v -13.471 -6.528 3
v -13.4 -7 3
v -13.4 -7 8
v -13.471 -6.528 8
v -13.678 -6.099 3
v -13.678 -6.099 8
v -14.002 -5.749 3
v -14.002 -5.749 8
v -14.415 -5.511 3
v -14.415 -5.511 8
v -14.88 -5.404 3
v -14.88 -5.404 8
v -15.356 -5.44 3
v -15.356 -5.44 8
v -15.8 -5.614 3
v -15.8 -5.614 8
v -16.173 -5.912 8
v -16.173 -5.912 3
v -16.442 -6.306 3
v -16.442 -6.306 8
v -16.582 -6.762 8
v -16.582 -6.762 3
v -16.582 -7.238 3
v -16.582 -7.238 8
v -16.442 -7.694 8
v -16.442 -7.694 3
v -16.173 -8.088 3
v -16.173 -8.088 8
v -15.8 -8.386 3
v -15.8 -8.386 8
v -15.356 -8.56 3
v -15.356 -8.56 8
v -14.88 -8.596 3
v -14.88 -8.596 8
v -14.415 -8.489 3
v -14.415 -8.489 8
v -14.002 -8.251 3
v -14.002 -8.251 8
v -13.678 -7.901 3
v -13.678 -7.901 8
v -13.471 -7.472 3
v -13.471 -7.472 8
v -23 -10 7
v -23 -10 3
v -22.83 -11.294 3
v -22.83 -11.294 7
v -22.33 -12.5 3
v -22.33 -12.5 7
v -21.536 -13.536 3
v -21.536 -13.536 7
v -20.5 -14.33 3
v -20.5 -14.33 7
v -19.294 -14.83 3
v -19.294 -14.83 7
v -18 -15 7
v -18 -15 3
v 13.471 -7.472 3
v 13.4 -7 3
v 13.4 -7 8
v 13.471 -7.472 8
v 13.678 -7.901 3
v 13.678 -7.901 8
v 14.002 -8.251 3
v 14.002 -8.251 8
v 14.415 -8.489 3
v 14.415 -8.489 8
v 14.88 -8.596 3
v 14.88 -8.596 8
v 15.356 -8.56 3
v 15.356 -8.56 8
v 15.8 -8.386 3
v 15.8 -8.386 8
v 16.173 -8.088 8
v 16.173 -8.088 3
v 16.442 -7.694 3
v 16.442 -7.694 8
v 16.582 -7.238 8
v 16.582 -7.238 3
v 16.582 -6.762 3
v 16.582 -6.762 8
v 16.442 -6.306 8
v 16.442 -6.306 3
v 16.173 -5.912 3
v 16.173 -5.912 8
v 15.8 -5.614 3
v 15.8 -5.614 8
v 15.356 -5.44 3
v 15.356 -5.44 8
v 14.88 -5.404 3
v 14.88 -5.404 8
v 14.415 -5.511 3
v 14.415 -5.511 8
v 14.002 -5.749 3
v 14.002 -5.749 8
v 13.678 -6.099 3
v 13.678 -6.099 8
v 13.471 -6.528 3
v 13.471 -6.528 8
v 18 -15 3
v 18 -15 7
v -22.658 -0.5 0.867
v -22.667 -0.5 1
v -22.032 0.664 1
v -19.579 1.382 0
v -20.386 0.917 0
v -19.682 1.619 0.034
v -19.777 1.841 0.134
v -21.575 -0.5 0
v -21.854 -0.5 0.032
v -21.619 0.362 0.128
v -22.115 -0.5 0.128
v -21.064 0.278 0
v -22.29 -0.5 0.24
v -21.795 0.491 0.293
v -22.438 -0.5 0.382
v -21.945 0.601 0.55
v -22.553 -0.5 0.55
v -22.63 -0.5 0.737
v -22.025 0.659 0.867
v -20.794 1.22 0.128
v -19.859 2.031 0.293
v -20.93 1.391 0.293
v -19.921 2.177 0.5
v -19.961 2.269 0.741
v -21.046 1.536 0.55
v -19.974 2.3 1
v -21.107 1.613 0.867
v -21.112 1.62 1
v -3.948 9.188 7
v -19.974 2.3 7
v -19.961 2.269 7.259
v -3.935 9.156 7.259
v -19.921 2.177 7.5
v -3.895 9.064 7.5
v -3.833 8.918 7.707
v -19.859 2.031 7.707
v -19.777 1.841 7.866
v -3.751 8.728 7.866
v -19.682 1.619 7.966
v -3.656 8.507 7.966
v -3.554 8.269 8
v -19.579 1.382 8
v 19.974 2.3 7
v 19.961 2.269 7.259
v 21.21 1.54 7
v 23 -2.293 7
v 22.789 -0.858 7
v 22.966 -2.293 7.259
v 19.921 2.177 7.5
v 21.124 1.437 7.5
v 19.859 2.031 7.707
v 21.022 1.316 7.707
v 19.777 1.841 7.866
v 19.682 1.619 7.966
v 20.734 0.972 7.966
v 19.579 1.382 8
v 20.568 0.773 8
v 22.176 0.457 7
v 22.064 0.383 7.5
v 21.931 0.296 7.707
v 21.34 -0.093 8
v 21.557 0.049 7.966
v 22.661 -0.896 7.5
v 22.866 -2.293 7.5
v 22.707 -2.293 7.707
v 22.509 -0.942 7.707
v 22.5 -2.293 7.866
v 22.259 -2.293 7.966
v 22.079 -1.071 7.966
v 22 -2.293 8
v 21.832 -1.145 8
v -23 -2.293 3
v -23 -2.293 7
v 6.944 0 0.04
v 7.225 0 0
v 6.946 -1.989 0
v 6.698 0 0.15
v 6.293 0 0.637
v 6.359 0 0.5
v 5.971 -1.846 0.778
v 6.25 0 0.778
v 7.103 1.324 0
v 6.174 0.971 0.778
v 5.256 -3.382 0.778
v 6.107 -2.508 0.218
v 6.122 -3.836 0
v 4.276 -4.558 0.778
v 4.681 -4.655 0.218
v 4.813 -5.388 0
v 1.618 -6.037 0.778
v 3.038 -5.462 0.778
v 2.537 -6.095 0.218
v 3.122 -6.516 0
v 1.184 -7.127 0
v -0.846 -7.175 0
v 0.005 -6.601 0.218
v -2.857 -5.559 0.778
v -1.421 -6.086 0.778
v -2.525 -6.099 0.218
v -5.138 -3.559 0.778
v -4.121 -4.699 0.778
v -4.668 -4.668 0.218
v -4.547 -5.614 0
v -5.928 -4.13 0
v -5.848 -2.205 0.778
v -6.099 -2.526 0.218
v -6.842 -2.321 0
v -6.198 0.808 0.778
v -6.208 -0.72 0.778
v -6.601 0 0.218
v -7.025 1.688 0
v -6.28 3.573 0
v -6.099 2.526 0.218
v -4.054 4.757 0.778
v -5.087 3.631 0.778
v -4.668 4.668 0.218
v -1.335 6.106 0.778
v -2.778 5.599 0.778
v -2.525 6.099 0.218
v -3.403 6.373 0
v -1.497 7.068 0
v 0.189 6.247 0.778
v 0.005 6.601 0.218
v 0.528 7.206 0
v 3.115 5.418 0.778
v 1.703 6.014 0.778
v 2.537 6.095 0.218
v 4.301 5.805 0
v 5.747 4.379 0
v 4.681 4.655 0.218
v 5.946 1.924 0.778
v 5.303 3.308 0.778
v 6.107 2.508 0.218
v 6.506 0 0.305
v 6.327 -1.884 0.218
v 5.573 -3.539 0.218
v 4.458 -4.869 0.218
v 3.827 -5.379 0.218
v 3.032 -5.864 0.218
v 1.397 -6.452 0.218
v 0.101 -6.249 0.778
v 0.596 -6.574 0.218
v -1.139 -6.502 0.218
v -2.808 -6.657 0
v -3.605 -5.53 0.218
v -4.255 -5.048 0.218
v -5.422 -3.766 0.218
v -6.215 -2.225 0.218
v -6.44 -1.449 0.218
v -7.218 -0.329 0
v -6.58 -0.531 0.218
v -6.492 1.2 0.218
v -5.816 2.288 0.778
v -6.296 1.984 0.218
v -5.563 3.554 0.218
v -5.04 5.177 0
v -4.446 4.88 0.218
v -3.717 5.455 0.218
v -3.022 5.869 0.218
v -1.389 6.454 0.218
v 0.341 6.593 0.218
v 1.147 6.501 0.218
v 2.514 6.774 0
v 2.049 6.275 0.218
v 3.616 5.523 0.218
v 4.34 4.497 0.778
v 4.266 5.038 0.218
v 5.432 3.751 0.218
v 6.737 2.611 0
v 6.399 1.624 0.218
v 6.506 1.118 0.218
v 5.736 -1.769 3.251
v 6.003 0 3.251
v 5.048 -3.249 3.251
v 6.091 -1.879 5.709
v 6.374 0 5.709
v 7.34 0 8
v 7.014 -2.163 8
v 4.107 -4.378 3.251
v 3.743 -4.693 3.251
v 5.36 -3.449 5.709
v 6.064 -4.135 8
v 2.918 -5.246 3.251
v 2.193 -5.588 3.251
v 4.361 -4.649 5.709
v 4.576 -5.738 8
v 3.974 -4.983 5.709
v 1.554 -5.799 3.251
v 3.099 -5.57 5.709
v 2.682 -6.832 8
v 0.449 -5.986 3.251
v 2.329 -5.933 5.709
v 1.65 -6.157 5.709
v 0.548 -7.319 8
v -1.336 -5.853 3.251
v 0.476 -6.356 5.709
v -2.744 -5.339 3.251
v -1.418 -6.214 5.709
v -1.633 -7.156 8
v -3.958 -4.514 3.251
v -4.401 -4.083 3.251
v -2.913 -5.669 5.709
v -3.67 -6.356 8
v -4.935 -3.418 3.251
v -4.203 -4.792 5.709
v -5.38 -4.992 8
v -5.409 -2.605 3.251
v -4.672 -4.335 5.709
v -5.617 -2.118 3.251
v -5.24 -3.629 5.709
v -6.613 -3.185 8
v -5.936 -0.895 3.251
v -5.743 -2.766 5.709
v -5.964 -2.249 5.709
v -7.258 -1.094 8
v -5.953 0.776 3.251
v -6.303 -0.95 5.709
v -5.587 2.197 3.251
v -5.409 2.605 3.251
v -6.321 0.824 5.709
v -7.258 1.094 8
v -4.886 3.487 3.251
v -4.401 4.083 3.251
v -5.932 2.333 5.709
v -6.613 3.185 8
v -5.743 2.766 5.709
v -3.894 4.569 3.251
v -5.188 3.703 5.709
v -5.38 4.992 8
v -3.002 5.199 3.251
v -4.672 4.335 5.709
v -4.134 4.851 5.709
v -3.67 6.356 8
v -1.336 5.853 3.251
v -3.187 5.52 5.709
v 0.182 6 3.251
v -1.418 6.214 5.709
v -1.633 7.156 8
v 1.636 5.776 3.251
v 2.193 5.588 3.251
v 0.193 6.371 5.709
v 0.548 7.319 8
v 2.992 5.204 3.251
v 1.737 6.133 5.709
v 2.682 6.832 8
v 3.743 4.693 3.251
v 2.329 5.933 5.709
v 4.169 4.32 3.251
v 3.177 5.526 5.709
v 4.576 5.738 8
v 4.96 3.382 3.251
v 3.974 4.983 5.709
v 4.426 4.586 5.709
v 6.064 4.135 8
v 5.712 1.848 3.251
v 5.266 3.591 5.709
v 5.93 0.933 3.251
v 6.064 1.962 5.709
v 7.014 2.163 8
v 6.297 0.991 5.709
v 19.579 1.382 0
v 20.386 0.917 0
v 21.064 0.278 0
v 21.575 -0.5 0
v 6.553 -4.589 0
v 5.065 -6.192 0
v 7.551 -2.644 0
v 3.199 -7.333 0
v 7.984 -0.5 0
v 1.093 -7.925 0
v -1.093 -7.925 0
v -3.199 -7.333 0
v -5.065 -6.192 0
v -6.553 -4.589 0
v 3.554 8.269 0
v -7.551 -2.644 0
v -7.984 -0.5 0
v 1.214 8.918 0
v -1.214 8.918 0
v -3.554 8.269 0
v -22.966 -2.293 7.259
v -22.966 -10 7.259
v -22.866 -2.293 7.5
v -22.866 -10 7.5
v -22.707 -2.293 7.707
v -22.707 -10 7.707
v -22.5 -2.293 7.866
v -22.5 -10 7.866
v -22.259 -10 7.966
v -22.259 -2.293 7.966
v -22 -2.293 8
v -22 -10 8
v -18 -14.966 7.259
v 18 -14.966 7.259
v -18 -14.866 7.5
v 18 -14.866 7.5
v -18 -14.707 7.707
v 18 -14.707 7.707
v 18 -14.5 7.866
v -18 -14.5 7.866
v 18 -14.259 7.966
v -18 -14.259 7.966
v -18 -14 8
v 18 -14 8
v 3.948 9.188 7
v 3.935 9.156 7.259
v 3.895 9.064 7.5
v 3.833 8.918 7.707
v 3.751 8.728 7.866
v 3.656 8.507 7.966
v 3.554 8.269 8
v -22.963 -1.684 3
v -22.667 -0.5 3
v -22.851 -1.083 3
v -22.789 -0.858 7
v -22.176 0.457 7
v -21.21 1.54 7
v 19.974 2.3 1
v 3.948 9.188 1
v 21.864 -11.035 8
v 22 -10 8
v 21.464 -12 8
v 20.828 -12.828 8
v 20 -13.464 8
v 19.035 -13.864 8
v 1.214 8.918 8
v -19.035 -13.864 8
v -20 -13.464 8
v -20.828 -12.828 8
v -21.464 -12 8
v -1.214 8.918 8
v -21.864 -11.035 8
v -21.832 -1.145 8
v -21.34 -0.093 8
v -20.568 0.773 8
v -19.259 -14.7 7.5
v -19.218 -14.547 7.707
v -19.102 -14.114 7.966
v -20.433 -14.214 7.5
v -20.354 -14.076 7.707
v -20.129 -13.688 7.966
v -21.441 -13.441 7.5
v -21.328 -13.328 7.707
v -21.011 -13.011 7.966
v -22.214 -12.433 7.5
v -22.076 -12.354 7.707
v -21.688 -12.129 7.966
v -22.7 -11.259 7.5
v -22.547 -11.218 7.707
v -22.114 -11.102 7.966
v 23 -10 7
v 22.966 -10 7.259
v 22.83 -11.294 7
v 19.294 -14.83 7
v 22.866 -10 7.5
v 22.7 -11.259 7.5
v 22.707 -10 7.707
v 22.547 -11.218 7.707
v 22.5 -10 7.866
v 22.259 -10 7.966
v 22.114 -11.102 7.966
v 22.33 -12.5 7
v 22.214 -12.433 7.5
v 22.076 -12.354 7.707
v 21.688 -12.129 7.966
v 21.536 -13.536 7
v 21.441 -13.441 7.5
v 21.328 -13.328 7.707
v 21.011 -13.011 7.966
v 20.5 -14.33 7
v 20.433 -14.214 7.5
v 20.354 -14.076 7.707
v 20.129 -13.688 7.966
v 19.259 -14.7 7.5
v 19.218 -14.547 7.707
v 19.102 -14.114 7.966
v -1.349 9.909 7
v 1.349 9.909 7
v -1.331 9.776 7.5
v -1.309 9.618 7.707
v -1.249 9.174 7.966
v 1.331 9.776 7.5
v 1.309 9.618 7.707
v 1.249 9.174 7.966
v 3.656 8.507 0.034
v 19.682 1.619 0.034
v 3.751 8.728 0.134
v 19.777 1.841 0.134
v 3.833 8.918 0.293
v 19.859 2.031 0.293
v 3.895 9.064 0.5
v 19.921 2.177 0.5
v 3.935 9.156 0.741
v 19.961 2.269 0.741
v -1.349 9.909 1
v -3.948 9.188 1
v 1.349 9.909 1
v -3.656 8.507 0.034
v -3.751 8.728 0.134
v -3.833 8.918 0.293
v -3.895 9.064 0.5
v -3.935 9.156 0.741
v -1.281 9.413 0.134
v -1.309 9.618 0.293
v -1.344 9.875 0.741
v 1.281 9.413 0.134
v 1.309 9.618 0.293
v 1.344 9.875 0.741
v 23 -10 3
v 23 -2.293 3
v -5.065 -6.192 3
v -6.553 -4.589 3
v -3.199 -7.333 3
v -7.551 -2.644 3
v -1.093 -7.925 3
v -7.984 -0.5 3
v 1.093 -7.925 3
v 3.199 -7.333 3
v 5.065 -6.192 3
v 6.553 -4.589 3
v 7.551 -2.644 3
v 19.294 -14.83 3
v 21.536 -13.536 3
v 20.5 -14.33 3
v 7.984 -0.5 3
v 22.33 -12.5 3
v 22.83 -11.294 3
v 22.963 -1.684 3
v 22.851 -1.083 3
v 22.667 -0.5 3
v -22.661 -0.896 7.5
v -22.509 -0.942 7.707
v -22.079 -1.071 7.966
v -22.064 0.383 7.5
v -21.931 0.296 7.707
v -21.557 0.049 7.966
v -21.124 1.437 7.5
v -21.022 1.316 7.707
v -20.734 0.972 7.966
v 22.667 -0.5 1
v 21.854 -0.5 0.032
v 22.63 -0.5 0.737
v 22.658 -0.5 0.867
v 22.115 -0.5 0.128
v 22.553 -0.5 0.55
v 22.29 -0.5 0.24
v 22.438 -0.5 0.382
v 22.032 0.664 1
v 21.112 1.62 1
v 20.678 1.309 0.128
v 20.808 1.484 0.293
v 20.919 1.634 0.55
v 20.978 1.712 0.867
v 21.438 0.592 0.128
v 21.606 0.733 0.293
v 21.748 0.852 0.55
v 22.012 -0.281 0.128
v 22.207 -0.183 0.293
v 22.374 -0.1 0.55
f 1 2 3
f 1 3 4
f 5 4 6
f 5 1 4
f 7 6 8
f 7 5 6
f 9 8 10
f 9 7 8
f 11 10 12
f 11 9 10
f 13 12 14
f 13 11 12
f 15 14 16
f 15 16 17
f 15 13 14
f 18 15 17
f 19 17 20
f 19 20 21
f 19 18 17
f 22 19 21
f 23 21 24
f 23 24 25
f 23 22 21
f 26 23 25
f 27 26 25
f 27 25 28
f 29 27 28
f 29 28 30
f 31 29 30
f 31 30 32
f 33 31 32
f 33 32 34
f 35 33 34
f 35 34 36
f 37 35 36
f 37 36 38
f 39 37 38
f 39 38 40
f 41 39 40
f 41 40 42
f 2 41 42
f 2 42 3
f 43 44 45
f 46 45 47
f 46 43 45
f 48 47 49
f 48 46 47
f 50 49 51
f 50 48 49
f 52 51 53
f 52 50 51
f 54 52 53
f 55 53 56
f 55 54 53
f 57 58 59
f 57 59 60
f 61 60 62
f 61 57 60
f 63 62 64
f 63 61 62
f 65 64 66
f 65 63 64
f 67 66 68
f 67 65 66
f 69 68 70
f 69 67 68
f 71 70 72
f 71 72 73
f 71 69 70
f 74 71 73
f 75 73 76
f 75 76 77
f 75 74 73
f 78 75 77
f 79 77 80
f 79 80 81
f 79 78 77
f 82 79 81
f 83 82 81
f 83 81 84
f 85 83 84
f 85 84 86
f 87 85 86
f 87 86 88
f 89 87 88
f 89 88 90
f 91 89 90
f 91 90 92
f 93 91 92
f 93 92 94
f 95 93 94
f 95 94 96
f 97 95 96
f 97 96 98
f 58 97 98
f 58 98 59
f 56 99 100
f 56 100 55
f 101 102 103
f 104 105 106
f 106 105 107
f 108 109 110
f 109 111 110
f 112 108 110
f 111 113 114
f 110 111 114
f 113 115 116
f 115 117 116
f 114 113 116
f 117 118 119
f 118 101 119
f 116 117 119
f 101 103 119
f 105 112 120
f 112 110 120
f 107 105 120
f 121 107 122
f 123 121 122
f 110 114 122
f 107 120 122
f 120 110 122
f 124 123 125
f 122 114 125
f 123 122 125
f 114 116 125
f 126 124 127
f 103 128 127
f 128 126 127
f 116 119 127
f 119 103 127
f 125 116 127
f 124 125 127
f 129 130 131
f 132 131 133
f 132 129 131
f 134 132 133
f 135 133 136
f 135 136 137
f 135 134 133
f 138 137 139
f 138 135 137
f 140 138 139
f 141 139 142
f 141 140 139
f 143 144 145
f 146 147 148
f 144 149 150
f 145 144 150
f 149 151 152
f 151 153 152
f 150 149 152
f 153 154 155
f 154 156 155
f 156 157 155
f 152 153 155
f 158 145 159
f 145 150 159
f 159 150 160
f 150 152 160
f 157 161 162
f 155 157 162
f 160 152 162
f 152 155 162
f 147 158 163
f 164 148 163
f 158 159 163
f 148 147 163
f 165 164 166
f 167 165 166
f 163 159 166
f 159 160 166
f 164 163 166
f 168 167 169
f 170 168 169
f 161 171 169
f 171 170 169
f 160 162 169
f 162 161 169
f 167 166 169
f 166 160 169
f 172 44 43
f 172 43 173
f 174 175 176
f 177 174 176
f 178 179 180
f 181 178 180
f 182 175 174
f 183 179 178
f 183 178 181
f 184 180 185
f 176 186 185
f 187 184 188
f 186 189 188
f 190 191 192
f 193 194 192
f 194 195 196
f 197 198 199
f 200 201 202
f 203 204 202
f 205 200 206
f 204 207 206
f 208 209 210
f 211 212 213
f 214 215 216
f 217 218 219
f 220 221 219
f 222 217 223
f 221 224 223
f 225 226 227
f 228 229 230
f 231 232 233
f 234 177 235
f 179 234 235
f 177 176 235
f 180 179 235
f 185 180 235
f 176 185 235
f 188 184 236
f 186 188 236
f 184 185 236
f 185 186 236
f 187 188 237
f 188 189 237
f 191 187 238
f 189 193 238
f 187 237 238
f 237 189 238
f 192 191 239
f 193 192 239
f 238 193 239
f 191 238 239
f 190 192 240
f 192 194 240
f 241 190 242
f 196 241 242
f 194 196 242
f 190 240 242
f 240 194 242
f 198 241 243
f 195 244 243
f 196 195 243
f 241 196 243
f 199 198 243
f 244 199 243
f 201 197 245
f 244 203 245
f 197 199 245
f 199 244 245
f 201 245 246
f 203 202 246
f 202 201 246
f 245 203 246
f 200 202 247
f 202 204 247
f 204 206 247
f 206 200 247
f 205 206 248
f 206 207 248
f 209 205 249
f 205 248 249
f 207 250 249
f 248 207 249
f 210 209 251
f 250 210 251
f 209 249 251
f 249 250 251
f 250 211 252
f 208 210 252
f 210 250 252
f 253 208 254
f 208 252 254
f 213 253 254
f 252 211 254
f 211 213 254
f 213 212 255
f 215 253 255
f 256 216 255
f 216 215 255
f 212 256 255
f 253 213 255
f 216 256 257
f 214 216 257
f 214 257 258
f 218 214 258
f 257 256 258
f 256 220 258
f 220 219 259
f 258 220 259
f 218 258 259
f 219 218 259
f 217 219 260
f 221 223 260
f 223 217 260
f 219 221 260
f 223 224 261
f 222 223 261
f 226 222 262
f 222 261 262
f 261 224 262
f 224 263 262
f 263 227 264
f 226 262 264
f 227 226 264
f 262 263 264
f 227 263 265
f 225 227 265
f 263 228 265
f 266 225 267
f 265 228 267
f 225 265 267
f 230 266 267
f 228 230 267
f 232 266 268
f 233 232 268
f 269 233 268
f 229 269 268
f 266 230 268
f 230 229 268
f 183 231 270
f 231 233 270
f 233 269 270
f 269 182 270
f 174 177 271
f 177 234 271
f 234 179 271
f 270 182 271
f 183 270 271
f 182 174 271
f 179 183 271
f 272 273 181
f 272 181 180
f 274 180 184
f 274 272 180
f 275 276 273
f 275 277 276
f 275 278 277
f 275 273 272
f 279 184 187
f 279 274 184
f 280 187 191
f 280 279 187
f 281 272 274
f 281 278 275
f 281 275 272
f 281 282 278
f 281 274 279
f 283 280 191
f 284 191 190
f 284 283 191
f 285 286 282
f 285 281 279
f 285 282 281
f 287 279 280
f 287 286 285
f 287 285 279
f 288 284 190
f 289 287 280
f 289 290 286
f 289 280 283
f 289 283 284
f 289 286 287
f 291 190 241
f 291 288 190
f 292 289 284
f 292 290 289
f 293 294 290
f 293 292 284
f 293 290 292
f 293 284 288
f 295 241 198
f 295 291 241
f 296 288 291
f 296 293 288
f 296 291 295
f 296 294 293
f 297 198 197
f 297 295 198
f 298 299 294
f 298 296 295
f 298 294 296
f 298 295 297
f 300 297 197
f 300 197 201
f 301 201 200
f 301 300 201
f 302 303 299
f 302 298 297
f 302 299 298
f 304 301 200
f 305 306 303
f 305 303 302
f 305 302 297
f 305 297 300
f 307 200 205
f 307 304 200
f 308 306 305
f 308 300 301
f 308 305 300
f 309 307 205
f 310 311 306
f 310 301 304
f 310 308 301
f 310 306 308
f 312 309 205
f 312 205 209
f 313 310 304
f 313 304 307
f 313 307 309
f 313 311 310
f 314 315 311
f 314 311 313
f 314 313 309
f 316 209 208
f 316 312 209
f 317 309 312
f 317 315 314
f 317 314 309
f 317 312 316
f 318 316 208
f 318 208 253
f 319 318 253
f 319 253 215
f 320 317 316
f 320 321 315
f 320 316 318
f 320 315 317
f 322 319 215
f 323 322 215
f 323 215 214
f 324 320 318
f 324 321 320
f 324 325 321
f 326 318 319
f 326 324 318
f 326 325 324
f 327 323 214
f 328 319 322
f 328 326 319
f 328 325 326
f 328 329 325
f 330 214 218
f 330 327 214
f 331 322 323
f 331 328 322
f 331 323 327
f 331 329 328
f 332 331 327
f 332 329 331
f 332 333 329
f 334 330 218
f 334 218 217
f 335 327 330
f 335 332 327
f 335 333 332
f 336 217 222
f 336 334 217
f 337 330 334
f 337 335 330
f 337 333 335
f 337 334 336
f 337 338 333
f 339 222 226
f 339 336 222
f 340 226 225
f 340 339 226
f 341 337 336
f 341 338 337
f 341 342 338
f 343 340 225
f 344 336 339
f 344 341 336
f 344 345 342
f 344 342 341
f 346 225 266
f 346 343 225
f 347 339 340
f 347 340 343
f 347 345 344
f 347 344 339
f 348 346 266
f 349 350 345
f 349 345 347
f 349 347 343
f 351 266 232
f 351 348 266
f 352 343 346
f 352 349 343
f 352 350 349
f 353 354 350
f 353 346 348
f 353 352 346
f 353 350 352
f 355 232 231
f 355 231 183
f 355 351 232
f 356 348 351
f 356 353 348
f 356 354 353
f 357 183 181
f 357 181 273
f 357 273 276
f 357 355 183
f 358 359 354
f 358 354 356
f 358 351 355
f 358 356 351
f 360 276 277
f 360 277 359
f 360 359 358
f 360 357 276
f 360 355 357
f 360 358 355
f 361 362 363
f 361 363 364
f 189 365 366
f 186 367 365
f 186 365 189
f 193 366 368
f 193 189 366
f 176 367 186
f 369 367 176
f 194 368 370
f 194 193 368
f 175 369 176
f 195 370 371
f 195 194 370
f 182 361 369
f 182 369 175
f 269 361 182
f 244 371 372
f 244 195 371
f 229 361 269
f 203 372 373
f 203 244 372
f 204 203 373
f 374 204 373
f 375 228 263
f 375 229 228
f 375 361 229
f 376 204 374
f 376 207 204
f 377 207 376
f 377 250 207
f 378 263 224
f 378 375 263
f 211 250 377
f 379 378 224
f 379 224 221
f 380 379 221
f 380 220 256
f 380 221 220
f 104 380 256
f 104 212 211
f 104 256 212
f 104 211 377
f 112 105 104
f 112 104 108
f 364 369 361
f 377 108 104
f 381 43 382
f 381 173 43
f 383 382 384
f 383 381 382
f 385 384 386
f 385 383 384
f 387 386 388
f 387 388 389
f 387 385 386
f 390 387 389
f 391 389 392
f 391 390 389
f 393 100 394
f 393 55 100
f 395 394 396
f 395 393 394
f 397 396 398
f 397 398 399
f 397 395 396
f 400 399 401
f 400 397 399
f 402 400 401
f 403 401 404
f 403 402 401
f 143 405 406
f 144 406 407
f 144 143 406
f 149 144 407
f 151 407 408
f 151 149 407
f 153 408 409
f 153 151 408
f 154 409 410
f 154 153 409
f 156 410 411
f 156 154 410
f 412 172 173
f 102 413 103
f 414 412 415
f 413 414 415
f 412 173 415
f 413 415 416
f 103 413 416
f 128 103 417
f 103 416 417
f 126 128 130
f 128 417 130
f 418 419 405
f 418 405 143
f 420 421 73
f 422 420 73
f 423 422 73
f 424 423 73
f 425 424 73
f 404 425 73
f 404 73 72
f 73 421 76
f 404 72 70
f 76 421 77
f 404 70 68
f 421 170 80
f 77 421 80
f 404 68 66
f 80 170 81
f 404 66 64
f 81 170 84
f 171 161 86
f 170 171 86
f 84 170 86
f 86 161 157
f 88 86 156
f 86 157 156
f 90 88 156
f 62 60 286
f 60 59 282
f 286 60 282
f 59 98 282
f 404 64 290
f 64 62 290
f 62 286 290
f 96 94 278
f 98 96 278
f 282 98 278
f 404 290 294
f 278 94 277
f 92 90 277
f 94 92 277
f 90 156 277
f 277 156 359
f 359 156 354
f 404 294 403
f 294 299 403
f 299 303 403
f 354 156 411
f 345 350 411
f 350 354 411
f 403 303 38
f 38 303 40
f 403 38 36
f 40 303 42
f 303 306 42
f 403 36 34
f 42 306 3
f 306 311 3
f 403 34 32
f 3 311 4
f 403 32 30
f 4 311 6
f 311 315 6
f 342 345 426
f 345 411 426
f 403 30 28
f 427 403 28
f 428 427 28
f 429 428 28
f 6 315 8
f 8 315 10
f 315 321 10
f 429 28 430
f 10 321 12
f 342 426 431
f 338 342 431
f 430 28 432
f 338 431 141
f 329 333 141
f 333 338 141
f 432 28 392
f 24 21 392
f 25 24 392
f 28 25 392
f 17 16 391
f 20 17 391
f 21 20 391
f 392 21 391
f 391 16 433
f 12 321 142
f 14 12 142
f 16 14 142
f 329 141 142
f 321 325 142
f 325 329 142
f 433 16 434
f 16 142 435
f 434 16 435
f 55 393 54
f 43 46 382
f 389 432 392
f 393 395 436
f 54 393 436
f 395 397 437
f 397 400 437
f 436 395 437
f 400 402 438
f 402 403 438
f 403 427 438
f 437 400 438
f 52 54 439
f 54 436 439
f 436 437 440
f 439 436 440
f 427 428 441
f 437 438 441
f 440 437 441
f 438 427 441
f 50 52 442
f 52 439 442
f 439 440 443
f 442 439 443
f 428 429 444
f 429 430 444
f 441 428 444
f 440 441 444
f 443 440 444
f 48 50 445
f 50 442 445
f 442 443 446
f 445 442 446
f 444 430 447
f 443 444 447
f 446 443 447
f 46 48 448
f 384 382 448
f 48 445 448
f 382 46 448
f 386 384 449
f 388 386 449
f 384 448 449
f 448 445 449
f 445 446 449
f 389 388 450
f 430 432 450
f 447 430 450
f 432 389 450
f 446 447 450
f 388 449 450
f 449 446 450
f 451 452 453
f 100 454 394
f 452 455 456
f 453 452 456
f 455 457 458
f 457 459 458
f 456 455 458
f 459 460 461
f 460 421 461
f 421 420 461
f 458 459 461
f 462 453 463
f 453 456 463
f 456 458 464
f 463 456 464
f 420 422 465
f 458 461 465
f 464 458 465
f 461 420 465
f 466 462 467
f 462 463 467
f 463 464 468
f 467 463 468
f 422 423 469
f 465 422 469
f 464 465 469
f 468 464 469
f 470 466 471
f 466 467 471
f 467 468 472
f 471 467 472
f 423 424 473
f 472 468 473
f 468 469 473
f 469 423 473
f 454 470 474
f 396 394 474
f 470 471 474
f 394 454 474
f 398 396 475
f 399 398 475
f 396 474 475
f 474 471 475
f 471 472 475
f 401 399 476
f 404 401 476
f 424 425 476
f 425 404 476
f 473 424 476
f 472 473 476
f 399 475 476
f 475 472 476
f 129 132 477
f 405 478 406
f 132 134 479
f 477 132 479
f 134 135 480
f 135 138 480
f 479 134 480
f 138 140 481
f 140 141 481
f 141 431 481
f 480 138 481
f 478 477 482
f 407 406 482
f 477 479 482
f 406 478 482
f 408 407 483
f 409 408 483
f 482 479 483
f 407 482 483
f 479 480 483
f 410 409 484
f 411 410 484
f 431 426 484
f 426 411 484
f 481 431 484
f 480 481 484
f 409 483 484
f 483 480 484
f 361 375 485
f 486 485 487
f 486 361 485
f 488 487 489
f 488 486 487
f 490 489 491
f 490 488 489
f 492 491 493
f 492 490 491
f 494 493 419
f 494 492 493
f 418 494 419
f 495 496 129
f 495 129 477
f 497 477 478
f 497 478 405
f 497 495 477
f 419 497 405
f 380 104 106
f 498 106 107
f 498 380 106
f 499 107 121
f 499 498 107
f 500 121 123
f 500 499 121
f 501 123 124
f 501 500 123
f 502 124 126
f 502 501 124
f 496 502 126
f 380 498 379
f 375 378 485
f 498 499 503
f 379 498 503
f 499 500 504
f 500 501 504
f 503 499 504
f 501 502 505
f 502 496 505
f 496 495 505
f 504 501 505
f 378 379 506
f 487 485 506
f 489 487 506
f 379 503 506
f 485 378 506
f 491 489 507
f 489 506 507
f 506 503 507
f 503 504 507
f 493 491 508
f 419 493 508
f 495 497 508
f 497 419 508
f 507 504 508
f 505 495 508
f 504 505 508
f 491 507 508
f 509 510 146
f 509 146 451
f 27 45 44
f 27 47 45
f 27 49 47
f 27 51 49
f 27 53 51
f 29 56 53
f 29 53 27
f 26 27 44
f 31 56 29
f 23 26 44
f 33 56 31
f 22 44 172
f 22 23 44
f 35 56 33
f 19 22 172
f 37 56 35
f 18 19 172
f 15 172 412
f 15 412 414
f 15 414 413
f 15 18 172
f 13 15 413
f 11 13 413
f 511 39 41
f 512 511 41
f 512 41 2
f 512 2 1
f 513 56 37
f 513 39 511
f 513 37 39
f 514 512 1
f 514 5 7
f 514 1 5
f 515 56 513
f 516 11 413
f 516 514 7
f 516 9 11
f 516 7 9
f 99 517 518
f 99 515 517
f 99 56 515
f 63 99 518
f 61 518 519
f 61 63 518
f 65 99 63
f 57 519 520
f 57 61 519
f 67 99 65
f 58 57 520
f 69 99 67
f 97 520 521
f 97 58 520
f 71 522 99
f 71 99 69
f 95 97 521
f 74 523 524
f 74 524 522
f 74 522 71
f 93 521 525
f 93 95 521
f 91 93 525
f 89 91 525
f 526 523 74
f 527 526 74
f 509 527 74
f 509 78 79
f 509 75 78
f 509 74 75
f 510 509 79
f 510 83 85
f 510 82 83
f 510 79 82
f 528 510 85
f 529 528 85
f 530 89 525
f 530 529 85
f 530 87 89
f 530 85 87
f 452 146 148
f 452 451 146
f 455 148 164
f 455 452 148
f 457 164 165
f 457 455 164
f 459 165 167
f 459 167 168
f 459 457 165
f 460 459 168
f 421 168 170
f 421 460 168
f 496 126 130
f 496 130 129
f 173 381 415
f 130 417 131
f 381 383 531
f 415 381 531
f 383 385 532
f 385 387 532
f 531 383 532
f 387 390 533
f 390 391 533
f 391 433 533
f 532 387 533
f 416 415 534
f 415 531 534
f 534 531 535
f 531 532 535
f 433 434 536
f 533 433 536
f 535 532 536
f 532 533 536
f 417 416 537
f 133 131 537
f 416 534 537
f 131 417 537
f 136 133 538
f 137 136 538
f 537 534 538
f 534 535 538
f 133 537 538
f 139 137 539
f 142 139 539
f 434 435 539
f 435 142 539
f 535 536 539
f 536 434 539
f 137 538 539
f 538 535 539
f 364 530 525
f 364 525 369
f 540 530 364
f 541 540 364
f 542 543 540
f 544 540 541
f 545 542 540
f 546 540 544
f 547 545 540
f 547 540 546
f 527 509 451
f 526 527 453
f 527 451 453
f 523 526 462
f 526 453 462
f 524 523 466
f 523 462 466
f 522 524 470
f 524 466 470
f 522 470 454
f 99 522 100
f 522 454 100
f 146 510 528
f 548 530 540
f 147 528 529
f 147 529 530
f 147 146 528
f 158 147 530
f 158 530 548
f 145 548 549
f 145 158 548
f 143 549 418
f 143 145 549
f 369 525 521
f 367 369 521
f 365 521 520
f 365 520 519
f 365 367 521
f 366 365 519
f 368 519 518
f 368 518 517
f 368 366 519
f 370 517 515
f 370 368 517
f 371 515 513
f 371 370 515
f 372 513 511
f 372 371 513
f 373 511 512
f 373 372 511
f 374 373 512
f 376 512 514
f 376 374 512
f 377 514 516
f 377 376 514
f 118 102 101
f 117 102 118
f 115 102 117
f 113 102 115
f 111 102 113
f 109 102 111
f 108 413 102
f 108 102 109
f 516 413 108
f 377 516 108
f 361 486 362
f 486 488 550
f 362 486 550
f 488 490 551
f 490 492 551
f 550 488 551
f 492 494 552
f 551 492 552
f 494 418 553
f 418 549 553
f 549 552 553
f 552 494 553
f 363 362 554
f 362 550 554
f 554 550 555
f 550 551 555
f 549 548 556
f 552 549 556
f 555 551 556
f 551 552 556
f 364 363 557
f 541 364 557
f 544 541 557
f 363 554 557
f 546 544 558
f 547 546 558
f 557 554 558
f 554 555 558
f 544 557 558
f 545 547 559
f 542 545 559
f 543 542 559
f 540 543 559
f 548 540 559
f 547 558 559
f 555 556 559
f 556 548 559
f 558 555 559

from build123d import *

# Parameters (mm, degrees)
ESQUISSE1_R             = 1.6
BOSS_EXTRU_1_DEPTH      = 8
ESQUISSE2_W             = 3
ESQUISSE2_H             = 14.5
ENL_V_MAT_EXTRU_1_DEPTH = 50.040799341
ESQUISSE5_R             = 8
BOSS_EXTRU_2_DEPTH      = 3
CONG_1_R                = 5
CONG_2_R                = 1


with BuildPart() as part:
    # Esquisse1 → Boss.-Extru.1 (new body)
    with BuildSketch(Plane.XY):
        with BuildLine():
            Line((-23, 1), (-3.948369031, 9.187512285))
            ThreePointArc((-3.948369031, 9.187512285), (0, 10), (3.948369031, 9.187512285))
            Line((3.948369031, 9.187512285), (23, 1))
            Line((23, 1), (23, -15))
            Line((23, -15), (-23, -15))
            Line((-23, -15), (-23, 1))
        make_face()
        with Locations((-15, -7)):
            Circle(ESQUISSE1_R, mode=Mode.SUBTRACT)
        with Locations(Location((15, -7, 0), (0, 0, 180))):
            Circle(ESQUISSE1_R, mode=Mode.SUBTRACT)
    extrude(amount=BOSS_EXTRU_1_DEPTH)

    # Esquisse2 → Enlèv. mat.-Extru.1 (cut, through all)
    with BuildSketch(Plane(origin=(23, 0, 0), x_dir=(0, 0, -1), z_dir=(1, 0, 0))):
        with Locations((-1.5, -7.75)):
            Rectangle(ESQUISSE2_W, ESQUISSE2_H)
    extrude(amount=-ENL_V_MAT_EXTRU_1_DEPTH, mode=Mode.SUBTRACT)

    # Esquisse5 → Boss.-Extru.2 (add)
    with BuildSketch(Plane(origin=(0, 0, 0), x_dir=(-1, 0, 0), z_dir=(0, 0, -1))):
        Circle(ESQUISSE5_R)
    extrude(amount=-BOSS_EXTRU_2_DEPTH)

    # Esquisse4 → Enlèvement de matière-Révolution1 (revolve, cut)
    with BuildSketch(Plane(origin=(0, 0, 0), x_dir=(0, 0, -1), z_dir=(1, 0, 0)), mode=Mode.PRIVATE) as enl_vement_de_mati_re_r_volution1_sk:
        with BuildLine():
            Line((-8, 0), (0, 0))
            Line((0, 0), (0, 6.460607986))
            ThreePointArc((0, 6.460607986), (-4.092346509, 6.059840087), (-8, 7.339745962))
            Line((-8, 7.339745962), (-8, 0))
        make_face()
    revolve(enl_vement_de_mati_re_r_volution1_sk.sketch.rotate(Axis((0, 0, 8), (0, 0, -1)), 90), axis=Axis((0, 0, 8), (0, 0, -1)), mode=Mode.SUBTRACT)

    # Congé1
    cong_1_edges = [part.edges().sort_by_distance(p)[0] for p in [
        (-23, -15, 5.5),
        (-23, 1, 4),
        (23, -15, 5.5),
        (23, 1, 4),
    ]]
    fillet(cong_1_edges, radius=CONG_1_R)

    # Congé2
    cong_2_edges = [part.edges().sort_by_distance(p)[0] for p in [
        (0, 10, 8),
        (-11.961276773, 5.743934112, 8),
        (-6.460607986, 0, 0),
        (-11.961276773, 5.743934112, 0),
        (0, -15, 8),
        (0, 10, 0),
        (-23, -6.146700103, 8),
        (23, -6.146700103, 8),
        (11.961276773, 5.743934112, 8),
        (22.175579156, 0.456970445, 8),
        (21.535533906, -13.535533906, 8),
        (-22.175579156, 0.456970445, 8),
        (-21.535533906, -13.535533906, 8),
        (11.961276773, 5.743934112, 0),
        (21.60386416, 1.17245656, 0),
        (-21.60386416, 1.17245656, 0),
    ]]
    fillet(cong_2_edges, radius=CONG_2_R)


solid = part.part
